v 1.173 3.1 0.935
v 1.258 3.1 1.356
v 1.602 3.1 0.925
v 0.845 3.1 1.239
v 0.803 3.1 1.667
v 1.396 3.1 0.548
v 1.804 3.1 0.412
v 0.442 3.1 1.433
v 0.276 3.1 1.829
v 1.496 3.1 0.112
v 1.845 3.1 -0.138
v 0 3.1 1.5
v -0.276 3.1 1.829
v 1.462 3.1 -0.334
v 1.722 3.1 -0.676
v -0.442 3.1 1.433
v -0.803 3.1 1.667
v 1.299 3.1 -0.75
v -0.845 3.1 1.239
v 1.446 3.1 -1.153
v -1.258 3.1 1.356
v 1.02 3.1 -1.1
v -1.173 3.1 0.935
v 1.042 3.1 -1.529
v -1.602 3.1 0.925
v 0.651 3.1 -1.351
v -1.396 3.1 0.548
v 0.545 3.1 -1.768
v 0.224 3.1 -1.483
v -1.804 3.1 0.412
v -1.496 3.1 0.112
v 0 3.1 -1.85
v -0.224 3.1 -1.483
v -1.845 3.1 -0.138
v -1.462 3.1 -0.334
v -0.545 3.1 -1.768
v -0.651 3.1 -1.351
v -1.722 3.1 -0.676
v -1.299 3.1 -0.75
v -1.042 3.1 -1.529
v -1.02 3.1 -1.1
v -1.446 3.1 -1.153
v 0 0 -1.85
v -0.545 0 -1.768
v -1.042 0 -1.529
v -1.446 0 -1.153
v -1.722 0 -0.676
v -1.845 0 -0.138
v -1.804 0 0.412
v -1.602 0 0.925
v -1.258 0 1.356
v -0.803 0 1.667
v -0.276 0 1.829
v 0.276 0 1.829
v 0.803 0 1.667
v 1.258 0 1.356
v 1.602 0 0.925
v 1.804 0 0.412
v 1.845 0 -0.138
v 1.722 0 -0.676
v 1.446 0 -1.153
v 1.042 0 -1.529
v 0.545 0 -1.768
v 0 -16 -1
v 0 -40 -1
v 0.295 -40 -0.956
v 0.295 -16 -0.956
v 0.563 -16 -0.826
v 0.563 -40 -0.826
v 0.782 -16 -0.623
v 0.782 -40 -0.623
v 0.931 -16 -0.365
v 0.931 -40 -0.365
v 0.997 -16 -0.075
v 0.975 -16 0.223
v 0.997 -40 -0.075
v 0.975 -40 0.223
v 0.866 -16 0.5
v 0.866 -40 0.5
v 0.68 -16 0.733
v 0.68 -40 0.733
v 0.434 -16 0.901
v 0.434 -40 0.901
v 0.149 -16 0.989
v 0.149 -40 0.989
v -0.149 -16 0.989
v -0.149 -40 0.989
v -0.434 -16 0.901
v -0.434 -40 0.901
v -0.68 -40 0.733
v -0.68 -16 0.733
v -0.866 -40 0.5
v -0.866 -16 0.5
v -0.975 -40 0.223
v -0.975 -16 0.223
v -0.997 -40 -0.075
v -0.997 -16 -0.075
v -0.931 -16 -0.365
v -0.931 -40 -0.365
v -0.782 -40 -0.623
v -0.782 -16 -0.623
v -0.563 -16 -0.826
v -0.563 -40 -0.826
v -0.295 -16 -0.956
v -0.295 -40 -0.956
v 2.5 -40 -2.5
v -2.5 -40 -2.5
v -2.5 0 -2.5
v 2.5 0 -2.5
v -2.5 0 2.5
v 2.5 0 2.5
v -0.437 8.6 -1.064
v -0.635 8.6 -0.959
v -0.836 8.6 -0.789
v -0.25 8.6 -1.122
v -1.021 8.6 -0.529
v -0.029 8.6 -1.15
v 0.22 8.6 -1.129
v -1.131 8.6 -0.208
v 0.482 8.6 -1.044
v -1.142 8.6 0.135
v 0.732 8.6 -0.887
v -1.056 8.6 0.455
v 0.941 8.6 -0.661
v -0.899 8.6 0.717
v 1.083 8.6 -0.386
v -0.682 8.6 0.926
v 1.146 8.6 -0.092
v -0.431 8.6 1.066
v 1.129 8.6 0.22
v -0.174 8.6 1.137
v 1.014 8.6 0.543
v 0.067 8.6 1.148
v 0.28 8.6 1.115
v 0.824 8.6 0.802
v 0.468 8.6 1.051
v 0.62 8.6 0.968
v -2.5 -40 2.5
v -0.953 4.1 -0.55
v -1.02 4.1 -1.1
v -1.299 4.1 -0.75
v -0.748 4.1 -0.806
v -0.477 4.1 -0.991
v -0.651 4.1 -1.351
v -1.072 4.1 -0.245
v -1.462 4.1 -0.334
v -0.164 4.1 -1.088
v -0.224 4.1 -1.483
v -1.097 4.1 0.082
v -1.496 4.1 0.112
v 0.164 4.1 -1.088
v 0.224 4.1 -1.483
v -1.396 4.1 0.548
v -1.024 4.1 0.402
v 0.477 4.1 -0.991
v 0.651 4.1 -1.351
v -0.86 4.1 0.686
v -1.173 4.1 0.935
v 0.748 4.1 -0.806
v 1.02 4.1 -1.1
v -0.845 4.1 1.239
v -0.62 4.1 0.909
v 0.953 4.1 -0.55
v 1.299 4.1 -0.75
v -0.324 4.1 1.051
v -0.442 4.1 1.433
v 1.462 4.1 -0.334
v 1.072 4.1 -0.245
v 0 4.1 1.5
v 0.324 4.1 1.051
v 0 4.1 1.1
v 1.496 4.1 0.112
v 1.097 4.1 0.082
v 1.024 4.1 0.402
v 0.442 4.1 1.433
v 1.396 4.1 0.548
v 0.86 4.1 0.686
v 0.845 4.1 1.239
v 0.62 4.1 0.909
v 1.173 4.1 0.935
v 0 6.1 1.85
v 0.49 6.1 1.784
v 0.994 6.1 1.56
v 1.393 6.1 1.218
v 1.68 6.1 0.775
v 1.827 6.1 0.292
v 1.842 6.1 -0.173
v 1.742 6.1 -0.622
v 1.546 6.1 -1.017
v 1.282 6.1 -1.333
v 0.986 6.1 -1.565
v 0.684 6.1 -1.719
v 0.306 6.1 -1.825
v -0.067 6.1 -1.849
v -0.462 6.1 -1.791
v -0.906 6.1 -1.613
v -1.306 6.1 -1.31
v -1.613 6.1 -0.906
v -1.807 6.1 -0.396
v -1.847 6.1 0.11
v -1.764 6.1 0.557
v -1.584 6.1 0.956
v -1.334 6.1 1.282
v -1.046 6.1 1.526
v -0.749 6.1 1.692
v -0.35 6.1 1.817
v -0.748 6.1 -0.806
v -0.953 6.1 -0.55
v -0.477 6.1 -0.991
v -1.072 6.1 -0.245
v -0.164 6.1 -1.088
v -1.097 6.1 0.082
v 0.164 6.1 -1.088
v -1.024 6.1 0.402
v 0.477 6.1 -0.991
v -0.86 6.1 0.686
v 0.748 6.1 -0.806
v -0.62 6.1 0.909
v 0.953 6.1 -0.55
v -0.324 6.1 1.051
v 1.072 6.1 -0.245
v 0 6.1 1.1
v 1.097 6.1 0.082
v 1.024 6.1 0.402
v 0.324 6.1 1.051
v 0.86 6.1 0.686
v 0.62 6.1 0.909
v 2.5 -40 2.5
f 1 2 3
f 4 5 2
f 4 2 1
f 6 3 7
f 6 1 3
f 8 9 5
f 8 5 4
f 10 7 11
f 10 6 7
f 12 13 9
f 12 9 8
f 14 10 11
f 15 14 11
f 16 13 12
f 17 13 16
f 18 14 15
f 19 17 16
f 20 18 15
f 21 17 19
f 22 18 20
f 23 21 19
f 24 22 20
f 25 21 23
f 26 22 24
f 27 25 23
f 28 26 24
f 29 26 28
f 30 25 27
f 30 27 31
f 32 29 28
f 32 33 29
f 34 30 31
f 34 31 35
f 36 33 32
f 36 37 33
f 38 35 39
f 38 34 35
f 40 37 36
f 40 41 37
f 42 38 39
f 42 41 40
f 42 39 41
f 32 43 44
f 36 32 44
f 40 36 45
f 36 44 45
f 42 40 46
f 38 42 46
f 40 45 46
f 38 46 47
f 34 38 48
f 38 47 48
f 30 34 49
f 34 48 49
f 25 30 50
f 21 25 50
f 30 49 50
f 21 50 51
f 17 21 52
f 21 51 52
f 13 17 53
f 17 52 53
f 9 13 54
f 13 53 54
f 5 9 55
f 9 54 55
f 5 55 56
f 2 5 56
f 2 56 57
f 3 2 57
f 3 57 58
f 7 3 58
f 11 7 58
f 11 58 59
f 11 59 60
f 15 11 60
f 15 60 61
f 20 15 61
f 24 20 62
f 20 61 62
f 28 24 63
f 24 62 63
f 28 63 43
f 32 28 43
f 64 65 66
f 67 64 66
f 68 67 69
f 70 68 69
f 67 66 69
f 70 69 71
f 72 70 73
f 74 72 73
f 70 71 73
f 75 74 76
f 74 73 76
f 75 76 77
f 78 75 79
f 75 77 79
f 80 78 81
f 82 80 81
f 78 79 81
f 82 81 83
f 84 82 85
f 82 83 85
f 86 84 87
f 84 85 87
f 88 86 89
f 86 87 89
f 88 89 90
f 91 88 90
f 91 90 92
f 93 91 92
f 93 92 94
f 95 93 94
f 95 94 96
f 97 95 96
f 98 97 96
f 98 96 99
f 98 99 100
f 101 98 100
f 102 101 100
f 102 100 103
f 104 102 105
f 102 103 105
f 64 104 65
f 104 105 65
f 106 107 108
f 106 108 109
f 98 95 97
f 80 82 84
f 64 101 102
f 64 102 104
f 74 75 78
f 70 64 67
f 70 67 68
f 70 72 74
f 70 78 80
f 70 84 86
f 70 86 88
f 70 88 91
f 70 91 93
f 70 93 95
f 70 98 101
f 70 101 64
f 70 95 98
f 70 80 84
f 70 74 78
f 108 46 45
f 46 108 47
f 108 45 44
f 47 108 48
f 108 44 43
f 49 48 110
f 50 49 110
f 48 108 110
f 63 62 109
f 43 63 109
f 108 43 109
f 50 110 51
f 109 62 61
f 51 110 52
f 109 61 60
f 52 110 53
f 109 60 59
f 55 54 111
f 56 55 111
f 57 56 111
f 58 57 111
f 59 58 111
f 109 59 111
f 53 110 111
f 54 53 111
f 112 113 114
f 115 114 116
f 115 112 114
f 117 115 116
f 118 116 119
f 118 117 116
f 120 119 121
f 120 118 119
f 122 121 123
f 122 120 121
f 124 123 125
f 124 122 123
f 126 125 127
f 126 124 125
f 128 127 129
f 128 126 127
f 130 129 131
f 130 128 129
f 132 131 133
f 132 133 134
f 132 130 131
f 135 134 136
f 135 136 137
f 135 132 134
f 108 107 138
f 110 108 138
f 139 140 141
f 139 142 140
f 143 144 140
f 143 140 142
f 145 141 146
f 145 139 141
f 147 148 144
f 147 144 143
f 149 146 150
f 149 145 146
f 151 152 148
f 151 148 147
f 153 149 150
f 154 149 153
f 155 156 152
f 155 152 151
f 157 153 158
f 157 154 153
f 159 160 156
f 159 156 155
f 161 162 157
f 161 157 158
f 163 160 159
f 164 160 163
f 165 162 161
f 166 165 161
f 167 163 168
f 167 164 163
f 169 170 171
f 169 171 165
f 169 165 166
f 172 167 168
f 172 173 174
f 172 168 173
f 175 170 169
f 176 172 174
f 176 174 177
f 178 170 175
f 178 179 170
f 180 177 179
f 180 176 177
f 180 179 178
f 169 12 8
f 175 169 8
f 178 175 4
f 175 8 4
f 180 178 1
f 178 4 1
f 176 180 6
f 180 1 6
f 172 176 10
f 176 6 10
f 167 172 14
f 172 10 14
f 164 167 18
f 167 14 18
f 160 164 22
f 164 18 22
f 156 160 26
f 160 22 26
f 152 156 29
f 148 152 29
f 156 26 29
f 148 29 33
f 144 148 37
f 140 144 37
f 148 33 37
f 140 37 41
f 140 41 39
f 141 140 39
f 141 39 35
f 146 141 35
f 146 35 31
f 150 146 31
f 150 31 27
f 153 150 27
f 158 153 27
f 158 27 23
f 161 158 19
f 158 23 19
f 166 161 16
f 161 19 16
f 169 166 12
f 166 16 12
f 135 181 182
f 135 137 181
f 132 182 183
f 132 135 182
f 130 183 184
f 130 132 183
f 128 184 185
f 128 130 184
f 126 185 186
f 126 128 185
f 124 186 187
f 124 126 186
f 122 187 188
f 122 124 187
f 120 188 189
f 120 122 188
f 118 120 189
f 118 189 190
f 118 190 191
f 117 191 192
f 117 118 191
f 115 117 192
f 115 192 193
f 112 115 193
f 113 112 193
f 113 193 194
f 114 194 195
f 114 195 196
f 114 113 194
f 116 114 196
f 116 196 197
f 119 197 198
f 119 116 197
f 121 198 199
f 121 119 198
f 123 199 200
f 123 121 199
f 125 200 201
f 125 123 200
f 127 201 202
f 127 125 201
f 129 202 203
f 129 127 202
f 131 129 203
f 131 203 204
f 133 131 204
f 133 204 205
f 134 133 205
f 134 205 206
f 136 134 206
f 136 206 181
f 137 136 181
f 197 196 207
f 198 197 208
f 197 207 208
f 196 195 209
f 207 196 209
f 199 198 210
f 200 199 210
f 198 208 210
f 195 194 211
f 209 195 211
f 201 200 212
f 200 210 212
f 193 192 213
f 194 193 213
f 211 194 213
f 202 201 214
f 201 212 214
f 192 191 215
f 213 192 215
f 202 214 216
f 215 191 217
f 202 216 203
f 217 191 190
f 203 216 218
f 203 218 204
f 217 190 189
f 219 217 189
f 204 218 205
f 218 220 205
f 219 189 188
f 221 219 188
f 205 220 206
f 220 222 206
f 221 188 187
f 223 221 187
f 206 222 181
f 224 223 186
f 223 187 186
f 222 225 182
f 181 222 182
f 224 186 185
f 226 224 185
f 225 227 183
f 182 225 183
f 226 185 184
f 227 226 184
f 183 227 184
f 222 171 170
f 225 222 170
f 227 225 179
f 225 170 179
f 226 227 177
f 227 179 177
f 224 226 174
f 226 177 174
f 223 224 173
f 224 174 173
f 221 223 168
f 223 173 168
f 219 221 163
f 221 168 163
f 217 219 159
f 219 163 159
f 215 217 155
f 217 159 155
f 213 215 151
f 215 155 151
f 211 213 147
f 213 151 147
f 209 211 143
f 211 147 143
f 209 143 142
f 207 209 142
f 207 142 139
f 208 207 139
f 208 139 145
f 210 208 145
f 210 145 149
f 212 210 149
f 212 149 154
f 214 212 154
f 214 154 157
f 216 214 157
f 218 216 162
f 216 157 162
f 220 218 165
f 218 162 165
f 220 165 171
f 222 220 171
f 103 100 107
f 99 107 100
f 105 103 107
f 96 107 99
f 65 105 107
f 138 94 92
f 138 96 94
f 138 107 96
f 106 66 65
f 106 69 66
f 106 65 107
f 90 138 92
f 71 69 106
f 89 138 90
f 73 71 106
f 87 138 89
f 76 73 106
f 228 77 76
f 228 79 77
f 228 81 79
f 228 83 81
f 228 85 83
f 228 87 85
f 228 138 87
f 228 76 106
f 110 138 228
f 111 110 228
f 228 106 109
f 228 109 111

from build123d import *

# Parameters (mm, degrees)
SKETCH1_R           = 1.85
BOSS_EXTRUDE1_DEPTH = 3.1
SKETCH2_R           = 1.5
BOSS_EXTRUDE2_DEPTH = 1
SKETCH3_R           = 1.1
BOSS_EXTRUDE3_DEPTH = 2
SKETCH6_W           = 5
SKETCH6_H           = 5
BOSS_EXTRUDE4_DEPTH = 40
SKETCH7_R           = 1
CUT_EXTRUDE1_DEPTH  = 24


with BuildPart() as part:
    # Sketch1 → Boss-Extrude1 (new body)
    with BuildSketch(Plane(origin=(0, 0, 0), x_dir=(1, 0, 0), z_dir=(0, 1, 0))):
        with Locations(Location((0, 0, 0), (0, 0, 90))):
            Circle(SKETCH1_R)
    extrude(amount=BOSS_EXTRUDE1_DEPTH)

    # Sketch2 → Boss-Extrude2 (add)
    with BuildSketch(Plane(origin=(0, 3.1, 0), x_dir=(1, 0, 0), z_dir=(0, 1, 0))):
        with Locations(Location((0, 0, 0), (0, 0, 270))):
            Circle(SKETCH2_R)
    extrude(amount=BOSS_EXTRUDE2_DEPTH)

    # Sketch3 → Boss-Extrude3 (add)
    with BuildSketch(Plane(origin=(0, 4.1, 0), x_dir=(1, 0, 0), z_dir=(0, 1, 0))):
        with Locations(Location((0, 0, 0), (0, 0, 270))):
            Circle(SKETCH3_R)
    extrude(amount=BOSS_EXTRUDE3_DEPTH)

    # Loft1: read off the stored shape, not the designer's step
    # Loft1: loft between two sections, ruled curve by curve
    loft1_from = [
        Edge.make_bspline([(0, 6.1, 1.85), (3.7, 6.1, 1.85), (3.7, 6.1, -1.85), (0, 6.1, -1.85), (-3.7, 6.1, -1.85), (-3.7, 6.1, 1.85), (0, 6.1, 1.85)], [0, 0, 0, 0, 0.5, 0.5, 0.5, 1, 1, 1, 1], 3, [1, 0.333333333, 0.333333333, 1, 0.333333333, 0.333333333, 1]),
    ]
    loft1_to = [
        Edge.make_bspline([(0.620465421, 8.6, 0.968257539), (2.556980499, 8.6, -0.272673303), (1.316049657, 8.6, -2.209188381), (-0.620465421, 8.6, -0.968257539), (-2.556980499, 8.6, 0.272673303), (-1.316049657, 8.6, 2.209188381), (0.620465421, 8.6, 0.968257539)], [0, 0, 0, 0, 0.5, 0.5, 0.5, 1, 1, 1, 1], 3, [1, 0.333333333, 0.333333333, 1, 0.333333333, 0.333333333, 1]),
    ]
    loft1 = Solid(Shell([*[Face.make_surface_from_curves(loft1_from[k], loft1_to[k]) for k in range(1)], Face(Wire(loft1_from)), Face(Wire(loft1_to))]))
    add(loft1)

    # Sketch6 → Boss-Extrude4 (add)
    with BuildSketch(Plane.XZ):
        Rectangle(SKETCH6_W, SKETCH6_H)
    extrude(amount=BOSS_EXTRUDE4_DEPTH)

    # Sketch7 → Cut-Extrude1 (cut)
    with BuildSketch(Plane.XZ.offset(40)):
        with Locations(Location((0, 0, 0), (0, 0, 270))):
            Circle(SKETCH7_R)
    extrude(amount=-CUT_EXTRUDE1_DEPTH, mode=Mode.SUBTRACT)


solid = part.part
